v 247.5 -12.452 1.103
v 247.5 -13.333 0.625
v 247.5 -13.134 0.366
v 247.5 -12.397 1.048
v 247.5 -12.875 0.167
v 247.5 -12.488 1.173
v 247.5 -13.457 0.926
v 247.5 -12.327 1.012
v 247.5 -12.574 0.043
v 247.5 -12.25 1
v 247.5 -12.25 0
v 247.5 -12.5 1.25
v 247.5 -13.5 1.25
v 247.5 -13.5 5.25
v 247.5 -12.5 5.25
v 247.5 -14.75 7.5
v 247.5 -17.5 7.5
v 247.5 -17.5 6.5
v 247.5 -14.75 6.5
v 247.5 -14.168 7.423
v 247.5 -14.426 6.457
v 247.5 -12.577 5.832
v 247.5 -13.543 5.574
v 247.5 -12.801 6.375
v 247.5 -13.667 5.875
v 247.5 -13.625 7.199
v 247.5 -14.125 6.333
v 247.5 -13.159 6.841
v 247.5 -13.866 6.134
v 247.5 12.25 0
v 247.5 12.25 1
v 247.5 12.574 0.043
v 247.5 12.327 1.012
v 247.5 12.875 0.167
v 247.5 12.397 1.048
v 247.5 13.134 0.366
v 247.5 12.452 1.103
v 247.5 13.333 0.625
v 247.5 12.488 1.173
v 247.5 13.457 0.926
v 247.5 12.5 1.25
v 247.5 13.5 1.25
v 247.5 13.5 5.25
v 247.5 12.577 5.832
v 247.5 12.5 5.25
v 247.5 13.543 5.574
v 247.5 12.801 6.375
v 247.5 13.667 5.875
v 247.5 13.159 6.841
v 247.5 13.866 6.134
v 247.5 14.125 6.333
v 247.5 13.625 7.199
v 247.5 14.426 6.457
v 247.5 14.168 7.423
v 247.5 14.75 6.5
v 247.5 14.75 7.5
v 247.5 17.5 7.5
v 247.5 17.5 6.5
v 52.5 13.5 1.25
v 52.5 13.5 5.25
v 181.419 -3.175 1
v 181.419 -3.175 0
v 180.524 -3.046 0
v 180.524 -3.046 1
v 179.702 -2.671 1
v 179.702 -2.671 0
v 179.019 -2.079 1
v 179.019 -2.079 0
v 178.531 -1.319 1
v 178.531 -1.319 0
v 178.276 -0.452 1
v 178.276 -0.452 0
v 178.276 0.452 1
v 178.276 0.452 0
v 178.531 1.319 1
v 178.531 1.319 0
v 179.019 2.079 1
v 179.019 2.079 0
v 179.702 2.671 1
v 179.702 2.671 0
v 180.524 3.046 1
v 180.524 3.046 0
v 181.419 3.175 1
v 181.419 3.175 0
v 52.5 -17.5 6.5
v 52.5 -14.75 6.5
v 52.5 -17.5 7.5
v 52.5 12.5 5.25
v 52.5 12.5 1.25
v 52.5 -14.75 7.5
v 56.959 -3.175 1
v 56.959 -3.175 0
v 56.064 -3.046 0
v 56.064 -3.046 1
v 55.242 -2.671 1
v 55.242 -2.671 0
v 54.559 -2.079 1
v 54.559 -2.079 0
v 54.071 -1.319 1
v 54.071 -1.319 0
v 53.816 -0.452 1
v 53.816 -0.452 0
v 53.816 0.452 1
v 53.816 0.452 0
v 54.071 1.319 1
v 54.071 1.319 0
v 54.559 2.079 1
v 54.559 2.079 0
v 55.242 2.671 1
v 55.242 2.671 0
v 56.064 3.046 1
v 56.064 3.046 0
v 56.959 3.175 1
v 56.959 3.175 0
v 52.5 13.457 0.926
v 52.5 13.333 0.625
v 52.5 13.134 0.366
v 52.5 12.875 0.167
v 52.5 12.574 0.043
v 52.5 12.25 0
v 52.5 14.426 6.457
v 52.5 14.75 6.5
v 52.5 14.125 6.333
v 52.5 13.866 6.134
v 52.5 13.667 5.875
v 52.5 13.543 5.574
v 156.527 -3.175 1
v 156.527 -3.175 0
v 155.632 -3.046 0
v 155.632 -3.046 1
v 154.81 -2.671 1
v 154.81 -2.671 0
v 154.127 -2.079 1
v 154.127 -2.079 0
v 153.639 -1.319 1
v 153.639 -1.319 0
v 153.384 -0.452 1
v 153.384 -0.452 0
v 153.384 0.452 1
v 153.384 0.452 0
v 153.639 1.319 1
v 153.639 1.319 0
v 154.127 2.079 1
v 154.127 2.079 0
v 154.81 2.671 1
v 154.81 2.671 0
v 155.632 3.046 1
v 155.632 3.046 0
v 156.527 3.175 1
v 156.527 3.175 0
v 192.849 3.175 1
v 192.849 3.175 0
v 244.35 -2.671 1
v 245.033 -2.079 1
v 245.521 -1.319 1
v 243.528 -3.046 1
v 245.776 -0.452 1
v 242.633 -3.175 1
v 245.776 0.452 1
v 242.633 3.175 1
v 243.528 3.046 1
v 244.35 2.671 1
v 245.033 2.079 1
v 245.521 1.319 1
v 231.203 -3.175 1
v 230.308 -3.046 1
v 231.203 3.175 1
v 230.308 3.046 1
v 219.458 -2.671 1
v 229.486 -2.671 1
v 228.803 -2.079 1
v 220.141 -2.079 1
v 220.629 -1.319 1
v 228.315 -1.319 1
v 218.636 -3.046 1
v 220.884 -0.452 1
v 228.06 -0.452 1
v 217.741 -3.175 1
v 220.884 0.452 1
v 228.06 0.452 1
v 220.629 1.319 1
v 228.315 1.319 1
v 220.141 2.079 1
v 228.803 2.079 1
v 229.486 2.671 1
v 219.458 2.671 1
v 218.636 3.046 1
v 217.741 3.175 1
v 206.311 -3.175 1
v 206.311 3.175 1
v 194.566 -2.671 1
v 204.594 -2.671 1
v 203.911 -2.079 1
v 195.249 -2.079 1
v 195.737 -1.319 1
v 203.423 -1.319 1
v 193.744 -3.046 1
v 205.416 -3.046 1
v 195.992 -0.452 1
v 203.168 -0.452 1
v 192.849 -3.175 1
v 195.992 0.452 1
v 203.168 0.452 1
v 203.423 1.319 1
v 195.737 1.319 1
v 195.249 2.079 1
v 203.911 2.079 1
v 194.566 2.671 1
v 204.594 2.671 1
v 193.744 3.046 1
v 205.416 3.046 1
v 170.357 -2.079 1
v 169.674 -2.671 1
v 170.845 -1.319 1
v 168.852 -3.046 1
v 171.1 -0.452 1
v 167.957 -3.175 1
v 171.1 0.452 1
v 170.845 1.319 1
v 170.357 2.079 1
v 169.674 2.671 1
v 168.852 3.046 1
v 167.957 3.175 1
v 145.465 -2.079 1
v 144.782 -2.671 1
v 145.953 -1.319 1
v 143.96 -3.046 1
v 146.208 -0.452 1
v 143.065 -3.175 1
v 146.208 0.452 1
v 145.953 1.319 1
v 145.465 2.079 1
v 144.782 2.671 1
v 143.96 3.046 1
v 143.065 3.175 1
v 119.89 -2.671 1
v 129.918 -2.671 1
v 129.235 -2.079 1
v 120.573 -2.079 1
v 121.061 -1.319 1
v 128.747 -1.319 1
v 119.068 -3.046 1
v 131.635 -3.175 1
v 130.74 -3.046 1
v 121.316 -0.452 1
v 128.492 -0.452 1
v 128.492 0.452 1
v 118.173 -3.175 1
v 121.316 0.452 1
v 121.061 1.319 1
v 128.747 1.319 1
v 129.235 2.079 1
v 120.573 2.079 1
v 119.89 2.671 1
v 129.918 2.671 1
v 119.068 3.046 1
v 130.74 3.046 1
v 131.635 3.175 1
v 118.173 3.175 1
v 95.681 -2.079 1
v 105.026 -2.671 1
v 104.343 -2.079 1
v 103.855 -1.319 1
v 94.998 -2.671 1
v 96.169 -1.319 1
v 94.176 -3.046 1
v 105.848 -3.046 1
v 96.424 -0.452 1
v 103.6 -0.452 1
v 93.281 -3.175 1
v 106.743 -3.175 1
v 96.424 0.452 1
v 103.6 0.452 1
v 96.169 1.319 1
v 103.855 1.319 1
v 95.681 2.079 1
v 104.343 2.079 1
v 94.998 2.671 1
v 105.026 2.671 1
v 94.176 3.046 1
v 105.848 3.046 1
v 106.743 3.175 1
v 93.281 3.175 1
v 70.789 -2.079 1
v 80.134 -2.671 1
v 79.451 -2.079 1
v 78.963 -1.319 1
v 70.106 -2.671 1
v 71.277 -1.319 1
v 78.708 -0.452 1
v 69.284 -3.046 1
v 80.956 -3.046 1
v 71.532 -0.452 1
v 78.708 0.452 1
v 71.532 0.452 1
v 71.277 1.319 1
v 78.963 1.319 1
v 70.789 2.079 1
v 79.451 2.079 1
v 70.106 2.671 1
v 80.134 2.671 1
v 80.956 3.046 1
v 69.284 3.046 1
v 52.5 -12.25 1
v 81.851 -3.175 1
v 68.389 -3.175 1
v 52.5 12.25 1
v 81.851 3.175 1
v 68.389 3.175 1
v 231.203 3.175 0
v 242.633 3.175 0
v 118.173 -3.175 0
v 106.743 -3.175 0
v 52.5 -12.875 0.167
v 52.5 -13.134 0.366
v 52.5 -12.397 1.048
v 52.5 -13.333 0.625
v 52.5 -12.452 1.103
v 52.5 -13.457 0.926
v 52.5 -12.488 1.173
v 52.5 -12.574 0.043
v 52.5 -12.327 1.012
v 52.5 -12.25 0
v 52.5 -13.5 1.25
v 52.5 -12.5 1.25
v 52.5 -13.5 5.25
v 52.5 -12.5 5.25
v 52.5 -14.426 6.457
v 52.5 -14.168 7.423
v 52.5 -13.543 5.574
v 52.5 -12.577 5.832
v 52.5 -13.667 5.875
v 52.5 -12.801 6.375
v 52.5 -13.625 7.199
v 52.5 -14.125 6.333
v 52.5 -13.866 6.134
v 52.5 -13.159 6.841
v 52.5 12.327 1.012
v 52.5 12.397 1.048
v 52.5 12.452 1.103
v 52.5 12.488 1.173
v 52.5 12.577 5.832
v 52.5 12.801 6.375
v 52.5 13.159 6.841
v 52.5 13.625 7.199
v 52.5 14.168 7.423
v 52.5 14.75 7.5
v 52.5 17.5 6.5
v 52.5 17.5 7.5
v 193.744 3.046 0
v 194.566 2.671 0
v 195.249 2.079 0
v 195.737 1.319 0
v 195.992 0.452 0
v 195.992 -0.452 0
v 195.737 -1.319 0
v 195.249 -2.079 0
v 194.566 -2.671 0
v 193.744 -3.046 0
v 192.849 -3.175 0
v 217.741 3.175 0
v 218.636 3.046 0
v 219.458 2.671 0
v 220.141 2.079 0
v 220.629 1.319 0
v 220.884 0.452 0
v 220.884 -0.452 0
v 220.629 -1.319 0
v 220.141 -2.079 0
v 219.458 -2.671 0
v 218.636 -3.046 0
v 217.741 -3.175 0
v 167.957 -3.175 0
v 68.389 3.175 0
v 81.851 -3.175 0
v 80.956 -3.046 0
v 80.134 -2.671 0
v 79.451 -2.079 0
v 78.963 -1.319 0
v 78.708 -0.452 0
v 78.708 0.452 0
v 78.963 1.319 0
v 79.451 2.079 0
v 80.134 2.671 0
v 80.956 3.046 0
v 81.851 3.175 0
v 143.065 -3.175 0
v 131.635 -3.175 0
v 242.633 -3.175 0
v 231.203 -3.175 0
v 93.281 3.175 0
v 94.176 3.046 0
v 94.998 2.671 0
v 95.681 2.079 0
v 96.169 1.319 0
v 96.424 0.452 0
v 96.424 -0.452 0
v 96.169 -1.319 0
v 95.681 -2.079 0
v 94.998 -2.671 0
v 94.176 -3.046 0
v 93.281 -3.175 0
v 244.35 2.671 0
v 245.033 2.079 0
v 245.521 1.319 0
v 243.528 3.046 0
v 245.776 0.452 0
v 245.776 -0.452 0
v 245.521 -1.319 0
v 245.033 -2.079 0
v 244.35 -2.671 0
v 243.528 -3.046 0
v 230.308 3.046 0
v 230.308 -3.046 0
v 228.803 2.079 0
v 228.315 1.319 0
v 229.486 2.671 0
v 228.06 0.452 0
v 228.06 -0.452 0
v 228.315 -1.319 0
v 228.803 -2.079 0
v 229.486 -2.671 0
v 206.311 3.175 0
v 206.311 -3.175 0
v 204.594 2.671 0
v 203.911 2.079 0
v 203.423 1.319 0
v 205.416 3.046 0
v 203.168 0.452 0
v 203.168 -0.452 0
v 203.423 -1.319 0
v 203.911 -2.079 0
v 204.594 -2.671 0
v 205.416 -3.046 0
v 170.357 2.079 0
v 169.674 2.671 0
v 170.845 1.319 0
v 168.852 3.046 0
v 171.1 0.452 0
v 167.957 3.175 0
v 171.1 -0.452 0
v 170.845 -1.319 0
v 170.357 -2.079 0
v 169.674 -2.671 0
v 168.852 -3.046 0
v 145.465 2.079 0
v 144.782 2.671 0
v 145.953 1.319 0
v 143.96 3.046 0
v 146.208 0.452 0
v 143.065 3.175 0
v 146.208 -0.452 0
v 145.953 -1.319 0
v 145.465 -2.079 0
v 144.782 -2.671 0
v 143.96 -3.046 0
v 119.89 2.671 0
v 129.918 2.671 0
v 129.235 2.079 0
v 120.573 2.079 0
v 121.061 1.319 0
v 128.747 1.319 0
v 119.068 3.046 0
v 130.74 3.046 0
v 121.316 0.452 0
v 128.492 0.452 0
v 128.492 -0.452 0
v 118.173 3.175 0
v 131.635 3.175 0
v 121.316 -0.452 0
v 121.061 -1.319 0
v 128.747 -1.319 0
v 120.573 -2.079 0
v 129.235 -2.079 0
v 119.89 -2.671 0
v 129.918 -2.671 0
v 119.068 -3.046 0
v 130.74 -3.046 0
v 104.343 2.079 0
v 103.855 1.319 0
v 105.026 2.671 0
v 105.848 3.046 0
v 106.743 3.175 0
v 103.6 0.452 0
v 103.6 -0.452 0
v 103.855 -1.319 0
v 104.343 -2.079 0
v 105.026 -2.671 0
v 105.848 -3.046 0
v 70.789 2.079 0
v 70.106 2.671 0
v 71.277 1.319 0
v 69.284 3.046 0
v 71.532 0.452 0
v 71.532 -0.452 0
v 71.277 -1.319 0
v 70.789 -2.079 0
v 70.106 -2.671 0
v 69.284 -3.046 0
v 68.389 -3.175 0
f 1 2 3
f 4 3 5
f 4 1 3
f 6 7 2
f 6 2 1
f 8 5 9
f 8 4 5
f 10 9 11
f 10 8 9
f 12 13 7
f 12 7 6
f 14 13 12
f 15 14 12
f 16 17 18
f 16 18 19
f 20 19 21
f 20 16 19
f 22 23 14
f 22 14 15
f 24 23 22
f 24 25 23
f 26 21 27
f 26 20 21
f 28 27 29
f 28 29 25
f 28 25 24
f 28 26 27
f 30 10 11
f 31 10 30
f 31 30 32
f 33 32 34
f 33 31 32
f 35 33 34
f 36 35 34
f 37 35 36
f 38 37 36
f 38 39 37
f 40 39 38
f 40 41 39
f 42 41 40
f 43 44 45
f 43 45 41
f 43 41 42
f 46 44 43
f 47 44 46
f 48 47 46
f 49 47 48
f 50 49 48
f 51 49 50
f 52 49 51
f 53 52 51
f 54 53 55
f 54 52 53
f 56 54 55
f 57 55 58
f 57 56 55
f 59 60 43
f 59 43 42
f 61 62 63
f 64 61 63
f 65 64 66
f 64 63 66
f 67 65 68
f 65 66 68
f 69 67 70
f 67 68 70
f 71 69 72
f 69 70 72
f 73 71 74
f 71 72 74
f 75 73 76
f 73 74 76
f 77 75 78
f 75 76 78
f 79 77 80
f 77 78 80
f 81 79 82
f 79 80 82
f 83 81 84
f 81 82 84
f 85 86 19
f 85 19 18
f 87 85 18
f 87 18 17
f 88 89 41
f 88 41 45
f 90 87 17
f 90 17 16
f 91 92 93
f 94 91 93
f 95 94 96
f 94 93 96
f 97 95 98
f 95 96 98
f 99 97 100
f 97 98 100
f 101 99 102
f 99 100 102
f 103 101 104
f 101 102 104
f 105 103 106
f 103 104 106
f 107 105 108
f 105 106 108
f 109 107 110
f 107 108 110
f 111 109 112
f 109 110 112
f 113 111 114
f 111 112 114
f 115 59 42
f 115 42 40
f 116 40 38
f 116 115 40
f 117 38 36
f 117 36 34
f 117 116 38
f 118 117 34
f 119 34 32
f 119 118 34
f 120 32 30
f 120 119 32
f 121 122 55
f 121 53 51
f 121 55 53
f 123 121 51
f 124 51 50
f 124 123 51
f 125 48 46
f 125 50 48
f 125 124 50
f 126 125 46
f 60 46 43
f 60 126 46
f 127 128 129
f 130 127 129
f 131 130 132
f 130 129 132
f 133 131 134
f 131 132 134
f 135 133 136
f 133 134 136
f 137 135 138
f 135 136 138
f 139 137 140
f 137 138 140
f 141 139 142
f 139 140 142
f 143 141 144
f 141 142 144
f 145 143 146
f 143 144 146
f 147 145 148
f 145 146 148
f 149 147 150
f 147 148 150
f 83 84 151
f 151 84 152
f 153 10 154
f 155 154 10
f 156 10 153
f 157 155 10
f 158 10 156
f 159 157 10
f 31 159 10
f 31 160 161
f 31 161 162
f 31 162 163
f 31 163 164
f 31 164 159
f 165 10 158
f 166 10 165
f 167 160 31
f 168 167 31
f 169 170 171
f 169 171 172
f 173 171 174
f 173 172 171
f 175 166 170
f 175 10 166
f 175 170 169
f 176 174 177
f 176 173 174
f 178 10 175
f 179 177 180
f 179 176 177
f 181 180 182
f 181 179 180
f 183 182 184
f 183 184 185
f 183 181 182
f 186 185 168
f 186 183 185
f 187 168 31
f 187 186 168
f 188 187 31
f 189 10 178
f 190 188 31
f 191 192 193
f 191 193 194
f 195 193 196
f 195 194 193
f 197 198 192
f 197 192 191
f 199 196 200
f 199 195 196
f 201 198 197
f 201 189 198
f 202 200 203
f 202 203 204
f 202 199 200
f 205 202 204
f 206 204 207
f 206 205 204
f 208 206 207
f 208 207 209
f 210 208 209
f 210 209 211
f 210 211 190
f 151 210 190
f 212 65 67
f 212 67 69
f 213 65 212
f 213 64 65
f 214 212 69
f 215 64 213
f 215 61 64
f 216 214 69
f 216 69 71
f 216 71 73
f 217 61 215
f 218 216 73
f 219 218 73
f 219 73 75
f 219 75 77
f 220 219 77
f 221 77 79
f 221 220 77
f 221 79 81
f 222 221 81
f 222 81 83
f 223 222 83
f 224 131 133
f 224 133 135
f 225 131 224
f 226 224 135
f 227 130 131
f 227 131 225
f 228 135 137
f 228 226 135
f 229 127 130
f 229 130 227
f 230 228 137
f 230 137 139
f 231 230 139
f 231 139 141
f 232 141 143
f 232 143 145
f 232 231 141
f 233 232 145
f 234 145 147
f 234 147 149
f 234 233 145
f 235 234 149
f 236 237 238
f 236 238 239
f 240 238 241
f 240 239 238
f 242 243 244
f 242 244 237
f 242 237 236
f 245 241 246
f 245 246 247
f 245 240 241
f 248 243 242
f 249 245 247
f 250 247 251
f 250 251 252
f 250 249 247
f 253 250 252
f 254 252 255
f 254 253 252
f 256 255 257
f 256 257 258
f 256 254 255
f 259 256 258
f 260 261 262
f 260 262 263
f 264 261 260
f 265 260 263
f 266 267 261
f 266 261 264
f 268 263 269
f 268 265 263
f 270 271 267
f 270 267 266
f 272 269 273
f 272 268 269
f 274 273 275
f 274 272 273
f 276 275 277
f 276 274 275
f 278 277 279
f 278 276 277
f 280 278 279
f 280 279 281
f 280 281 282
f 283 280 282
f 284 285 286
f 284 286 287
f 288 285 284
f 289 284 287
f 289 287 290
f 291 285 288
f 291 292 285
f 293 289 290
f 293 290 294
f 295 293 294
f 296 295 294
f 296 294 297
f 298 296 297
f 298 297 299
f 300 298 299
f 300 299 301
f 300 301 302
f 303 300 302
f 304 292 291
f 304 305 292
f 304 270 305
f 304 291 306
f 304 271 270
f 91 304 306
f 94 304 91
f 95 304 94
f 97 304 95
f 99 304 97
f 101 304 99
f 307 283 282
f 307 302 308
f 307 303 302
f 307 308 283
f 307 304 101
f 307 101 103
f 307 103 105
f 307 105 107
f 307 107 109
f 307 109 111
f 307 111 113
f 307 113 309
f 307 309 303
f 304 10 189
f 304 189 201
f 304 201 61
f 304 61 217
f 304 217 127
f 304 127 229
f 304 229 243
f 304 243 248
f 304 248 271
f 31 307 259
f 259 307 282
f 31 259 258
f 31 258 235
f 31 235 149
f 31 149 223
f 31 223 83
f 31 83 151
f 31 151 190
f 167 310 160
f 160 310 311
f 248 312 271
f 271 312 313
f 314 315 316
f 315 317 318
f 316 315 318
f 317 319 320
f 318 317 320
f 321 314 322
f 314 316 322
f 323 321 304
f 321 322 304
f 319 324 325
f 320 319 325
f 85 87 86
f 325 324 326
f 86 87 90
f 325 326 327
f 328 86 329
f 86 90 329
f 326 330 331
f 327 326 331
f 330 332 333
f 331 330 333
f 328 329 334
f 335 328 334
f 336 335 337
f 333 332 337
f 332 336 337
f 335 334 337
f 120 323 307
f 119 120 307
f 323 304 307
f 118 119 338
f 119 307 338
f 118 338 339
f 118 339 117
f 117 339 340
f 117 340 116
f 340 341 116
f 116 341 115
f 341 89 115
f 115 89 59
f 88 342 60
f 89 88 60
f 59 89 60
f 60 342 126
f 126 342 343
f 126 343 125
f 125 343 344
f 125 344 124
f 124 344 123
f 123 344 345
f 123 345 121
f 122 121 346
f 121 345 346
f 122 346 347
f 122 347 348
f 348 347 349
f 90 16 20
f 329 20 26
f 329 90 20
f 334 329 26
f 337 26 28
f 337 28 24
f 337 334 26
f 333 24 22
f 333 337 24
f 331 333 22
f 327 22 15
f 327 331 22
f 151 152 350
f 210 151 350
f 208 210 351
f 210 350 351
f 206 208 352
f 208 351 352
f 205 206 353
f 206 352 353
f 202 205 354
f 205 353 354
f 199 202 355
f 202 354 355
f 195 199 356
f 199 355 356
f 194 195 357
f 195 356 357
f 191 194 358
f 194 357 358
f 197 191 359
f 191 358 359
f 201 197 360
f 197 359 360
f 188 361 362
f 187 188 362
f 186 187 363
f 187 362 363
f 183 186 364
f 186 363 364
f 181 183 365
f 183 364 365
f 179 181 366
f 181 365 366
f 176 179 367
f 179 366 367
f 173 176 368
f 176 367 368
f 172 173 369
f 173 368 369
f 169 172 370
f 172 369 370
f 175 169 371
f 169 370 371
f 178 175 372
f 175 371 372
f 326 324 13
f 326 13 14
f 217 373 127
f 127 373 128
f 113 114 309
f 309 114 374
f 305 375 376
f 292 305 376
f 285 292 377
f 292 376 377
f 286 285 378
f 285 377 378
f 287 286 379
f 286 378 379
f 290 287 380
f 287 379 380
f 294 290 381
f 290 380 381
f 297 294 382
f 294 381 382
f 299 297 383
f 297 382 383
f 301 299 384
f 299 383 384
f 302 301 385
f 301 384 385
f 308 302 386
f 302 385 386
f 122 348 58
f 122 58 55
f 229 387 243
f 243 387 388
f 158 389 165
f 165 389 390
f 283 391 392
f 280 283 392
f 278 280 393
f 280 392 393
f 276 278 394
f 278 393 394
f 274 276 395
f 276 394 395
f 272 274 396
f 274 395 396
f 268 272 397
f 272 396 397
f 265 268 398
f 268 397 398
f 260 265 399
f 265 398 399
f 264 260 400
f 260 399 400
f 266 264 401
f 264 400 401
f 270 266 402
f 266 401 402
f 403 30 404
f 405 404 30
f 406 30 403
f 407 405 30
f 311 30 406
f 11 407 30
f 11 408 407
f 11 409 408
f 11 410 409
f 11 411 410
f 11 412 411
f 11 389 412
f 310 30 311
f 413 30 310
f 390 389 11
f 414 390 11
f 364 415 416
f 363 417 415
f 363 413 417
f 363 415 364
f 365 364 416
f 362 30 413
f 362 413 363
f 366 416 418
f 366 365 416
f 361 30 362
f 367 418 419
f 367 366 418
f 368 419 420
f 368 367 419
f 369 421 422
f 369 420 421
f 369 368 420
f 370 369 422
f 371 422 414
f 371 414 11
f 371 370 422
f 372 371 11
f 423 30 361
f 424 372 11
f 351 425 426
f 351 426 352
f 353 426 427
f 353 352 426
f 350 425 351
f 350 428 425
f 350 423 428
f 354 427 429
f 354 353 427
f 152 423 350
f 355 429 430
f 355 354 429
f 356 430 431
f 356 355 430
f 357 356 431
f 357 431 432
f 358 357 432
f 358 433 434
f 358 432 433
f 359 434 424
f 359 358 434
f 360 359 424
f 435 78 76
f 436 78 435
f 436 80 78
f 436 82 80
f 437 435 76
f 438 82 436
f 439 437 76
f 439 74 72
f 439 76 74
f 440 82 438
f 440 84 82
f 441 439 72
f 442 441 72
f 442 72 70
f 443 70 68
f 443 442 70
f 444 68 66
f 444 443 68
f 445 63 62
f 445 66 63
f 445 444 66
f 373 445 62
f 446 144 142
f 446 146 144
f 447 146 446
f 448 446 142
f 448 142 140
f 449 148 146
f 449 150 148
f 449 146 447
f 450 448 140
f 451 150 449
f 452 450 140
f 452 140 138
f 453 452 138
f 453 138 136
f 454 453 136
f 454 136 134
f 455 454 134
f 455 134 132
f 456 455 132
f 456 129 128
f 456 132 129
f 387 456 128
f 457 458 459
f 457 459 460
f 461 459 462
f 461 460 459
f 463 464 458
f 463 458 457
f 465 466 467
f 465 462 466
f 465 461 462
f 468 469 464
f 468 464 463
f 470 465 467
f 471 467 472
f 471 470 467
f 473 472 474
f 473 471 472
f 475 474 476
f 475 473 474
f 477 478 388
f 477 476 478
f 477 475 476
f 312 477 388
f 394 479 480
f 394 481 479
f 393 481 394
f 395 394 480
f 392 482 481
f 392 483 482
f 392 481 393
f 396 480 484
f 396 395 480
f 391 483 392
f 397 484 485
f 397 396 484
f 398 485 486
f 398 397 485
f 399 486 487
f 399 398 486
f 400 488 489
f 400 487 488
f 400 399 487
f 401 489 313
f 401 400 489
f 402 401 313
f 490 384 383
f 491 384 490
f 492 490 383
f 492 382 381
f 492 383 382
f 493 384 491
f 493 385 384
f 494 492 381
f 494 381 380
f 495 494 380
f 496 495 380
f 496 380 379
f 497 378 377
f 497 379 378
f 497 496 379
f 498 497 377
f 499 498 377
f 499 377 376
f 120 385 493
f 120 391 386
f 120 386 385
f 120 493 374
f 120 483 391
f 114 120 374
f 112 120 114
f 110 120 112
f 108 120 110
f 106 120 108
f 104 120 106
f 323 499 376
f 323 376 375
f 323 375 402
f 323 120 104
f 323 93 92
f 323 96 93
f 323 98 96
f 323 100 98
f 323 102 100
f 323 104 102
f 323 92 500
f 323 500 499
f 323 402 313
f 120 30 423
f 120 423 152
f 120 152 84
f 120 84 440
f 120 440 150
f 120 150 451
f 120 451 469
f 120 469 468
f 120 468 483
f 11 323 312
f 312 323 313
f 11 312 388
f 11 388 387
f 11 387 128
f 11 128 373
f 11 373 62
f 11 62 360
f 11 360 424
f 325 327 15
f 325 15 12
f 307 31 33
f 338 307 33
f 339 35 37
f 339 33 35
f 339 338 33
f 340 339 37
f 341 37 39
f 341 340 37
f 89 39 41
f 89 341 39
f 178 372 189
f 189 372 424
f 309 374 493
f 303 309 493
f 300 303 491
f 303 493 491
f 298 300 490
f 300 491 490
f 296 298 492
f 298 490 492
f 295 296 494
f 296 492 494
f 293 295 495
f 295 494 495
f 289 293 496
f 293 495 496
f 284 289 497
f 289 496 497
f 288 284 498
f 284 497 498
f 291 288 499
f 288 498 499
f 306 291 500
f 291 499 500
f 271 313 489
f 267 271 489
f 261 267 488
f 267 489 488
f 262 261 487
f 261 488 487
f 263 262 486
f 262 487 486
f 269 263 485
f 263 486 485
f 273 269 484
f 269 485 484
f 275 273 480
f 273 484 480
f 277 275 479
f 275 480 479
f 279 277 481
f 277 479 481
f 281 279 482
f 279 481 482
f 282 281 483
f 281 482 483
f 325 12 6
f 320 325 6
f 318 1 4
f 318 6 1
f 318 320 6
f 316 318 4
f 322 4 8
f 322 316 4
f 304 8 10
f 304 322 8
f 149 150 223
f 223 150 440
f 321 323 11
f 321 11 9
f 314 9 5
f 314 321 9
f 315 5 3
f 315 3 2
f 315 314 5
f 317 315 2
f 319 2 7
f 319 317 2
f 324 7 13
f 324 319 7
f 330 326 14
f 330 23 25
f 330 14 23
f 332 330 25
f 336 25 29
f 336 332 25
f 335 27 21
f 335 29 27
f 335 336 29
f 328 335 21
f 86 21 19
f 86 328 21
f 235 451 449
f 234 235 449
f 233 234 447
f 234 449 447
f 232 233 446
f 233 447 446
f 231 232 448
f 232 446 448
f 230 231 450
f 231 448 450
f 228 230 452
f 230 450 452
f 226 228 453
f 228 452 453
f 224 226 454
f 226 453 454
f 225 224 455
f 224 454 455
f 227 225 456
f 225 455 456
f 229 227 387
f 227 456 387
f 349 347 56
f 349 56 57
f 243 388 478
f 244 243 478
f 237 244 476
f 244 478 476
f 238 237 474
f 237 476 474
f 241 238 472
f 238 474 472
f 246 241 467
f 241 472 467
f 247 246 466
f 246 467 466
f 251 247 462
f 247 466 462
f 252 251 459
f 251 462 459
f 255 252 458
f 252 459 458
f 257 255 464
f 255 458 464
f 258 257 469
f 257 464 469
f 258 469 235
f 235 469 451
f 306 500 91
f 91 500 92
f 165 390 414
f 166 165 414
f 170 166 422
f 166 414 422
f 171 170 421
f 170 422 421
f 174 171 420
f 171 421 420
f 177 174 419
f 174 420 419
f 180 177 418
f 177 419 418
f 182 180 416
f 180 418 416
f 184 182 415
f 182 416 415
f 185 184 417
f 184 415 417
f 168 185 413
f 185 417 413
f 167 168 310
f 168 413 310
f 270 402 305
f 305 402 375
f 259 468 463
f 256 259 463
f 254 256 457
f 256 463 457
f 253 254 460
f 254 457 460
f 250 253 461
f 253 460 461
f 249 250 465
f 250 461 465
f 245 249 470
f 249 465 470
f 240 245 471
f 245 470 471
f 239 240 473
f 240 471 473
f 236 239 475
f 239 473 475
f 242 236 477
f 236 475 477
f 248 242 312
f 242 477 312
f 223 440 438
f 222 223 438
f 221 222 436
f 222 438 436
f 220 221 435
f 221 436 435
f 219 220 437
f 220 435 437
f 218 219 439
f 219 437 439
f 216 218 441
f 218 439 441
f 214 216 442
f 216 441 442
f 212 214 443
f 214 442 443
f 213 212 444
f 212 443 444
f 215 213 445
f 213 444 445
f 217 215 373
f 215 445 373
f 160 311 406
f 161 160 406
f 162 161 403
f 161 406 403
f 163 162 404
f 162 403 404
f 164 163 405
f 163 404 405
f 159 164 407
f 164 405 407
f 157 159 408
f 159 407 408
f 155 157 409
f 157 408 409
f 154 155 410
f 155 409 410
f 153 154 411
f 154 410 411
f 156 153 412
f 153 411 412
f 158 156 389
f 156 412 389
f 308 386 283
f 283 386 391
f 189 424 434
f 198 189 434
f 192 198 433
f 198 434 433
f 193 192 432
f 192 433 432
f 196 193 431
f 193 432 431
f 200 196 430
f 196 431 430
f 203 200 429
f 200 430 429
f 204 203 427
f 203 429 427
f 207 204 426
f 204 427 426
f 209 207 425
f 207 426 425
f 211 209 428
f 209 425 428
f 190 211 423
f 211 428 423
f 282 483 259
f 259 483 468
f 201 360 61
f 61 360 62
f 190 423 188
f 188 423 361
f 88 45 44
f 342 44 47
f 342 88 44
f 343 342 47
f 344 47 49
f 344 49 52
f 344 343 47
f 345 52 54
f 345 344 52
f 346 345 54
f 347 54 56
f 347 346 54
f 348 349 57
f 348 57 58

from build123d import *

# Parameters (mm, degrees)
STRUCTURAL_MEMBER1_DEPTH = 500
CUT_EXTRUDE1_REACH       = 252.724
LPATTERN1_COUNT          = 196
LPATTERN1_PITCH          = 24.892
SKETCH4_W                = 4000
SKETCH4_H                = 182.847095399
CUT_EXTRUDE2_DEPTH       = 140
SKETCH5_W                = 3.509513676
SKETCH5_H                = 55.564681105
CUT_EXTRUDE3_DEPTH       = 140


with BuildPart() as part:
    # Sketch2 → Structural Member1 (new body)
    with BuildSketch(Plane(origin=(-250, 0, 0), x_dir=(0, 0, -1), z_dir=(1, 0, 0))):
        with BuildLine():
            Line((0, 12.25), (0, -12.25))
            ThreePointArc((0, -12.25), (-0.366116524, -13.133883476), (-1.25, -13.5))
            Line((-1.25, -13.5), (-5.25, -13.5))
            ThreePointArc((-5.25, -13.5), (-6.133883476, -13.866116524), (-6.5, -14.75))
            Line((-6.5, -14.75), (-6.5, -17.5))
            Line((-6.5, -17.5), (-7.5, -17.5))
            Line((-7.5, -17.5), (-7.5, -14.75))
            ThreePointArc((-7.5, -14.75), (-6.840990258, -13.159009742), (-5.25, -12.5))
            Line((-5.25, -12.5), (-1.25, -12.5))
            ThreePointArc((-1.25, -12.5), (-1.073223305, -12.426776695), (-1, -12.25))
            Line((-1, -12.25), (-1, 12.25))
            ThreePointArc((-1, 12.25), (-1.073223305, 12.426776695), (-1.25, 12.5))
            Line((-1.25, 12.5), (-5.25, 12.5))
            ThreePointArc((-5.25, 12.5), (-6.840990258, 13.159009742), (-7.5, 14.75))
            Line((-7.5, 14.75), (-7.5, 17.5))
            Line((-7.5, 17.5), (-6.5, 17.5))
            Line((-6.5, 17.5), (-6.5, 14.75))
            ThreePointArc((-6.5, 14.75), (-6.133883476, 13.866116524), (-5.25, 13.5))
            Line((-5.25, 13.5), (-1.25, 13.5))
            ThreePointArc((-1.25, 13.5), (-0.366116524, 13.133883476), (0, 12.25))
        make_face()
    extrude(amount=STRUCTURAL_MEMBER1_DEPTH)

    # Sketch3 → Cut-Extrude1 (cut, up to next)
    with BuildSketch(Plane.XY, mode=Mode.PRIVATE) as cut_extrude1_sk1:
        with BuildLine():
            Line((-241.745, 3.175), (-230.315, 3.175))
            ThreePointArc((-230.315, 3.175), (-227.14, 0), (-230.315, -3.175))
            Line((-230.315, -3.175), (-241.745, -3.175))
            ThreePointArc((-241.745, -3.175), (-244.92, 0), (-241.745, 3.175))
        make_face()
    cut_extrude1_tool1 = extrude(cut_extrude1_sk1.sketch, amount=CUT_EXTRUDE1_REACH, mode=Mode.PRIVATE) & part.part
    cut_extrude1 = cut_extrude1_tool1.solids().sort_by_distance((-236.03, 0, 0))[0]
    add(cut_extrude1, mode=Mode.SUBTRACT)

    # LPattern1: Cut-Extrude1 ×196
    with Locations(*[(i * LPATTERN1_PITCH, 0, 0) for i in range(1, LPATTERN1_COUNT)]):
        add(cut_extrude1, mode=Mode.SUBTRACT)

    # Sketch4 → Cut-Extrude2 (cut)
    with BuildSketch(Plane.XY.offset(7.5)):
        with Locations((-1947.5, -12.909953422)):
            Rectangle(SKETCH4_W, SKETCH4_H)
    extrude(amount=-CUT_EXTRUDE2_DEPTH, mode=Mode.SUBTRACT)

    # Sketch5 → Cut-Extrude3 (cut)
    with BuildSketch(Plane.XY.offset(7.5)):
        with Locations((249.254756838, -3.17340083)):
            Rectangle(SKETCH5_W, SKETCH5_H)
    extrude(amount=-CUT_EXTRUDE3_DEPTH, mode=Mode.SUBTRACT)


solid = part.part
